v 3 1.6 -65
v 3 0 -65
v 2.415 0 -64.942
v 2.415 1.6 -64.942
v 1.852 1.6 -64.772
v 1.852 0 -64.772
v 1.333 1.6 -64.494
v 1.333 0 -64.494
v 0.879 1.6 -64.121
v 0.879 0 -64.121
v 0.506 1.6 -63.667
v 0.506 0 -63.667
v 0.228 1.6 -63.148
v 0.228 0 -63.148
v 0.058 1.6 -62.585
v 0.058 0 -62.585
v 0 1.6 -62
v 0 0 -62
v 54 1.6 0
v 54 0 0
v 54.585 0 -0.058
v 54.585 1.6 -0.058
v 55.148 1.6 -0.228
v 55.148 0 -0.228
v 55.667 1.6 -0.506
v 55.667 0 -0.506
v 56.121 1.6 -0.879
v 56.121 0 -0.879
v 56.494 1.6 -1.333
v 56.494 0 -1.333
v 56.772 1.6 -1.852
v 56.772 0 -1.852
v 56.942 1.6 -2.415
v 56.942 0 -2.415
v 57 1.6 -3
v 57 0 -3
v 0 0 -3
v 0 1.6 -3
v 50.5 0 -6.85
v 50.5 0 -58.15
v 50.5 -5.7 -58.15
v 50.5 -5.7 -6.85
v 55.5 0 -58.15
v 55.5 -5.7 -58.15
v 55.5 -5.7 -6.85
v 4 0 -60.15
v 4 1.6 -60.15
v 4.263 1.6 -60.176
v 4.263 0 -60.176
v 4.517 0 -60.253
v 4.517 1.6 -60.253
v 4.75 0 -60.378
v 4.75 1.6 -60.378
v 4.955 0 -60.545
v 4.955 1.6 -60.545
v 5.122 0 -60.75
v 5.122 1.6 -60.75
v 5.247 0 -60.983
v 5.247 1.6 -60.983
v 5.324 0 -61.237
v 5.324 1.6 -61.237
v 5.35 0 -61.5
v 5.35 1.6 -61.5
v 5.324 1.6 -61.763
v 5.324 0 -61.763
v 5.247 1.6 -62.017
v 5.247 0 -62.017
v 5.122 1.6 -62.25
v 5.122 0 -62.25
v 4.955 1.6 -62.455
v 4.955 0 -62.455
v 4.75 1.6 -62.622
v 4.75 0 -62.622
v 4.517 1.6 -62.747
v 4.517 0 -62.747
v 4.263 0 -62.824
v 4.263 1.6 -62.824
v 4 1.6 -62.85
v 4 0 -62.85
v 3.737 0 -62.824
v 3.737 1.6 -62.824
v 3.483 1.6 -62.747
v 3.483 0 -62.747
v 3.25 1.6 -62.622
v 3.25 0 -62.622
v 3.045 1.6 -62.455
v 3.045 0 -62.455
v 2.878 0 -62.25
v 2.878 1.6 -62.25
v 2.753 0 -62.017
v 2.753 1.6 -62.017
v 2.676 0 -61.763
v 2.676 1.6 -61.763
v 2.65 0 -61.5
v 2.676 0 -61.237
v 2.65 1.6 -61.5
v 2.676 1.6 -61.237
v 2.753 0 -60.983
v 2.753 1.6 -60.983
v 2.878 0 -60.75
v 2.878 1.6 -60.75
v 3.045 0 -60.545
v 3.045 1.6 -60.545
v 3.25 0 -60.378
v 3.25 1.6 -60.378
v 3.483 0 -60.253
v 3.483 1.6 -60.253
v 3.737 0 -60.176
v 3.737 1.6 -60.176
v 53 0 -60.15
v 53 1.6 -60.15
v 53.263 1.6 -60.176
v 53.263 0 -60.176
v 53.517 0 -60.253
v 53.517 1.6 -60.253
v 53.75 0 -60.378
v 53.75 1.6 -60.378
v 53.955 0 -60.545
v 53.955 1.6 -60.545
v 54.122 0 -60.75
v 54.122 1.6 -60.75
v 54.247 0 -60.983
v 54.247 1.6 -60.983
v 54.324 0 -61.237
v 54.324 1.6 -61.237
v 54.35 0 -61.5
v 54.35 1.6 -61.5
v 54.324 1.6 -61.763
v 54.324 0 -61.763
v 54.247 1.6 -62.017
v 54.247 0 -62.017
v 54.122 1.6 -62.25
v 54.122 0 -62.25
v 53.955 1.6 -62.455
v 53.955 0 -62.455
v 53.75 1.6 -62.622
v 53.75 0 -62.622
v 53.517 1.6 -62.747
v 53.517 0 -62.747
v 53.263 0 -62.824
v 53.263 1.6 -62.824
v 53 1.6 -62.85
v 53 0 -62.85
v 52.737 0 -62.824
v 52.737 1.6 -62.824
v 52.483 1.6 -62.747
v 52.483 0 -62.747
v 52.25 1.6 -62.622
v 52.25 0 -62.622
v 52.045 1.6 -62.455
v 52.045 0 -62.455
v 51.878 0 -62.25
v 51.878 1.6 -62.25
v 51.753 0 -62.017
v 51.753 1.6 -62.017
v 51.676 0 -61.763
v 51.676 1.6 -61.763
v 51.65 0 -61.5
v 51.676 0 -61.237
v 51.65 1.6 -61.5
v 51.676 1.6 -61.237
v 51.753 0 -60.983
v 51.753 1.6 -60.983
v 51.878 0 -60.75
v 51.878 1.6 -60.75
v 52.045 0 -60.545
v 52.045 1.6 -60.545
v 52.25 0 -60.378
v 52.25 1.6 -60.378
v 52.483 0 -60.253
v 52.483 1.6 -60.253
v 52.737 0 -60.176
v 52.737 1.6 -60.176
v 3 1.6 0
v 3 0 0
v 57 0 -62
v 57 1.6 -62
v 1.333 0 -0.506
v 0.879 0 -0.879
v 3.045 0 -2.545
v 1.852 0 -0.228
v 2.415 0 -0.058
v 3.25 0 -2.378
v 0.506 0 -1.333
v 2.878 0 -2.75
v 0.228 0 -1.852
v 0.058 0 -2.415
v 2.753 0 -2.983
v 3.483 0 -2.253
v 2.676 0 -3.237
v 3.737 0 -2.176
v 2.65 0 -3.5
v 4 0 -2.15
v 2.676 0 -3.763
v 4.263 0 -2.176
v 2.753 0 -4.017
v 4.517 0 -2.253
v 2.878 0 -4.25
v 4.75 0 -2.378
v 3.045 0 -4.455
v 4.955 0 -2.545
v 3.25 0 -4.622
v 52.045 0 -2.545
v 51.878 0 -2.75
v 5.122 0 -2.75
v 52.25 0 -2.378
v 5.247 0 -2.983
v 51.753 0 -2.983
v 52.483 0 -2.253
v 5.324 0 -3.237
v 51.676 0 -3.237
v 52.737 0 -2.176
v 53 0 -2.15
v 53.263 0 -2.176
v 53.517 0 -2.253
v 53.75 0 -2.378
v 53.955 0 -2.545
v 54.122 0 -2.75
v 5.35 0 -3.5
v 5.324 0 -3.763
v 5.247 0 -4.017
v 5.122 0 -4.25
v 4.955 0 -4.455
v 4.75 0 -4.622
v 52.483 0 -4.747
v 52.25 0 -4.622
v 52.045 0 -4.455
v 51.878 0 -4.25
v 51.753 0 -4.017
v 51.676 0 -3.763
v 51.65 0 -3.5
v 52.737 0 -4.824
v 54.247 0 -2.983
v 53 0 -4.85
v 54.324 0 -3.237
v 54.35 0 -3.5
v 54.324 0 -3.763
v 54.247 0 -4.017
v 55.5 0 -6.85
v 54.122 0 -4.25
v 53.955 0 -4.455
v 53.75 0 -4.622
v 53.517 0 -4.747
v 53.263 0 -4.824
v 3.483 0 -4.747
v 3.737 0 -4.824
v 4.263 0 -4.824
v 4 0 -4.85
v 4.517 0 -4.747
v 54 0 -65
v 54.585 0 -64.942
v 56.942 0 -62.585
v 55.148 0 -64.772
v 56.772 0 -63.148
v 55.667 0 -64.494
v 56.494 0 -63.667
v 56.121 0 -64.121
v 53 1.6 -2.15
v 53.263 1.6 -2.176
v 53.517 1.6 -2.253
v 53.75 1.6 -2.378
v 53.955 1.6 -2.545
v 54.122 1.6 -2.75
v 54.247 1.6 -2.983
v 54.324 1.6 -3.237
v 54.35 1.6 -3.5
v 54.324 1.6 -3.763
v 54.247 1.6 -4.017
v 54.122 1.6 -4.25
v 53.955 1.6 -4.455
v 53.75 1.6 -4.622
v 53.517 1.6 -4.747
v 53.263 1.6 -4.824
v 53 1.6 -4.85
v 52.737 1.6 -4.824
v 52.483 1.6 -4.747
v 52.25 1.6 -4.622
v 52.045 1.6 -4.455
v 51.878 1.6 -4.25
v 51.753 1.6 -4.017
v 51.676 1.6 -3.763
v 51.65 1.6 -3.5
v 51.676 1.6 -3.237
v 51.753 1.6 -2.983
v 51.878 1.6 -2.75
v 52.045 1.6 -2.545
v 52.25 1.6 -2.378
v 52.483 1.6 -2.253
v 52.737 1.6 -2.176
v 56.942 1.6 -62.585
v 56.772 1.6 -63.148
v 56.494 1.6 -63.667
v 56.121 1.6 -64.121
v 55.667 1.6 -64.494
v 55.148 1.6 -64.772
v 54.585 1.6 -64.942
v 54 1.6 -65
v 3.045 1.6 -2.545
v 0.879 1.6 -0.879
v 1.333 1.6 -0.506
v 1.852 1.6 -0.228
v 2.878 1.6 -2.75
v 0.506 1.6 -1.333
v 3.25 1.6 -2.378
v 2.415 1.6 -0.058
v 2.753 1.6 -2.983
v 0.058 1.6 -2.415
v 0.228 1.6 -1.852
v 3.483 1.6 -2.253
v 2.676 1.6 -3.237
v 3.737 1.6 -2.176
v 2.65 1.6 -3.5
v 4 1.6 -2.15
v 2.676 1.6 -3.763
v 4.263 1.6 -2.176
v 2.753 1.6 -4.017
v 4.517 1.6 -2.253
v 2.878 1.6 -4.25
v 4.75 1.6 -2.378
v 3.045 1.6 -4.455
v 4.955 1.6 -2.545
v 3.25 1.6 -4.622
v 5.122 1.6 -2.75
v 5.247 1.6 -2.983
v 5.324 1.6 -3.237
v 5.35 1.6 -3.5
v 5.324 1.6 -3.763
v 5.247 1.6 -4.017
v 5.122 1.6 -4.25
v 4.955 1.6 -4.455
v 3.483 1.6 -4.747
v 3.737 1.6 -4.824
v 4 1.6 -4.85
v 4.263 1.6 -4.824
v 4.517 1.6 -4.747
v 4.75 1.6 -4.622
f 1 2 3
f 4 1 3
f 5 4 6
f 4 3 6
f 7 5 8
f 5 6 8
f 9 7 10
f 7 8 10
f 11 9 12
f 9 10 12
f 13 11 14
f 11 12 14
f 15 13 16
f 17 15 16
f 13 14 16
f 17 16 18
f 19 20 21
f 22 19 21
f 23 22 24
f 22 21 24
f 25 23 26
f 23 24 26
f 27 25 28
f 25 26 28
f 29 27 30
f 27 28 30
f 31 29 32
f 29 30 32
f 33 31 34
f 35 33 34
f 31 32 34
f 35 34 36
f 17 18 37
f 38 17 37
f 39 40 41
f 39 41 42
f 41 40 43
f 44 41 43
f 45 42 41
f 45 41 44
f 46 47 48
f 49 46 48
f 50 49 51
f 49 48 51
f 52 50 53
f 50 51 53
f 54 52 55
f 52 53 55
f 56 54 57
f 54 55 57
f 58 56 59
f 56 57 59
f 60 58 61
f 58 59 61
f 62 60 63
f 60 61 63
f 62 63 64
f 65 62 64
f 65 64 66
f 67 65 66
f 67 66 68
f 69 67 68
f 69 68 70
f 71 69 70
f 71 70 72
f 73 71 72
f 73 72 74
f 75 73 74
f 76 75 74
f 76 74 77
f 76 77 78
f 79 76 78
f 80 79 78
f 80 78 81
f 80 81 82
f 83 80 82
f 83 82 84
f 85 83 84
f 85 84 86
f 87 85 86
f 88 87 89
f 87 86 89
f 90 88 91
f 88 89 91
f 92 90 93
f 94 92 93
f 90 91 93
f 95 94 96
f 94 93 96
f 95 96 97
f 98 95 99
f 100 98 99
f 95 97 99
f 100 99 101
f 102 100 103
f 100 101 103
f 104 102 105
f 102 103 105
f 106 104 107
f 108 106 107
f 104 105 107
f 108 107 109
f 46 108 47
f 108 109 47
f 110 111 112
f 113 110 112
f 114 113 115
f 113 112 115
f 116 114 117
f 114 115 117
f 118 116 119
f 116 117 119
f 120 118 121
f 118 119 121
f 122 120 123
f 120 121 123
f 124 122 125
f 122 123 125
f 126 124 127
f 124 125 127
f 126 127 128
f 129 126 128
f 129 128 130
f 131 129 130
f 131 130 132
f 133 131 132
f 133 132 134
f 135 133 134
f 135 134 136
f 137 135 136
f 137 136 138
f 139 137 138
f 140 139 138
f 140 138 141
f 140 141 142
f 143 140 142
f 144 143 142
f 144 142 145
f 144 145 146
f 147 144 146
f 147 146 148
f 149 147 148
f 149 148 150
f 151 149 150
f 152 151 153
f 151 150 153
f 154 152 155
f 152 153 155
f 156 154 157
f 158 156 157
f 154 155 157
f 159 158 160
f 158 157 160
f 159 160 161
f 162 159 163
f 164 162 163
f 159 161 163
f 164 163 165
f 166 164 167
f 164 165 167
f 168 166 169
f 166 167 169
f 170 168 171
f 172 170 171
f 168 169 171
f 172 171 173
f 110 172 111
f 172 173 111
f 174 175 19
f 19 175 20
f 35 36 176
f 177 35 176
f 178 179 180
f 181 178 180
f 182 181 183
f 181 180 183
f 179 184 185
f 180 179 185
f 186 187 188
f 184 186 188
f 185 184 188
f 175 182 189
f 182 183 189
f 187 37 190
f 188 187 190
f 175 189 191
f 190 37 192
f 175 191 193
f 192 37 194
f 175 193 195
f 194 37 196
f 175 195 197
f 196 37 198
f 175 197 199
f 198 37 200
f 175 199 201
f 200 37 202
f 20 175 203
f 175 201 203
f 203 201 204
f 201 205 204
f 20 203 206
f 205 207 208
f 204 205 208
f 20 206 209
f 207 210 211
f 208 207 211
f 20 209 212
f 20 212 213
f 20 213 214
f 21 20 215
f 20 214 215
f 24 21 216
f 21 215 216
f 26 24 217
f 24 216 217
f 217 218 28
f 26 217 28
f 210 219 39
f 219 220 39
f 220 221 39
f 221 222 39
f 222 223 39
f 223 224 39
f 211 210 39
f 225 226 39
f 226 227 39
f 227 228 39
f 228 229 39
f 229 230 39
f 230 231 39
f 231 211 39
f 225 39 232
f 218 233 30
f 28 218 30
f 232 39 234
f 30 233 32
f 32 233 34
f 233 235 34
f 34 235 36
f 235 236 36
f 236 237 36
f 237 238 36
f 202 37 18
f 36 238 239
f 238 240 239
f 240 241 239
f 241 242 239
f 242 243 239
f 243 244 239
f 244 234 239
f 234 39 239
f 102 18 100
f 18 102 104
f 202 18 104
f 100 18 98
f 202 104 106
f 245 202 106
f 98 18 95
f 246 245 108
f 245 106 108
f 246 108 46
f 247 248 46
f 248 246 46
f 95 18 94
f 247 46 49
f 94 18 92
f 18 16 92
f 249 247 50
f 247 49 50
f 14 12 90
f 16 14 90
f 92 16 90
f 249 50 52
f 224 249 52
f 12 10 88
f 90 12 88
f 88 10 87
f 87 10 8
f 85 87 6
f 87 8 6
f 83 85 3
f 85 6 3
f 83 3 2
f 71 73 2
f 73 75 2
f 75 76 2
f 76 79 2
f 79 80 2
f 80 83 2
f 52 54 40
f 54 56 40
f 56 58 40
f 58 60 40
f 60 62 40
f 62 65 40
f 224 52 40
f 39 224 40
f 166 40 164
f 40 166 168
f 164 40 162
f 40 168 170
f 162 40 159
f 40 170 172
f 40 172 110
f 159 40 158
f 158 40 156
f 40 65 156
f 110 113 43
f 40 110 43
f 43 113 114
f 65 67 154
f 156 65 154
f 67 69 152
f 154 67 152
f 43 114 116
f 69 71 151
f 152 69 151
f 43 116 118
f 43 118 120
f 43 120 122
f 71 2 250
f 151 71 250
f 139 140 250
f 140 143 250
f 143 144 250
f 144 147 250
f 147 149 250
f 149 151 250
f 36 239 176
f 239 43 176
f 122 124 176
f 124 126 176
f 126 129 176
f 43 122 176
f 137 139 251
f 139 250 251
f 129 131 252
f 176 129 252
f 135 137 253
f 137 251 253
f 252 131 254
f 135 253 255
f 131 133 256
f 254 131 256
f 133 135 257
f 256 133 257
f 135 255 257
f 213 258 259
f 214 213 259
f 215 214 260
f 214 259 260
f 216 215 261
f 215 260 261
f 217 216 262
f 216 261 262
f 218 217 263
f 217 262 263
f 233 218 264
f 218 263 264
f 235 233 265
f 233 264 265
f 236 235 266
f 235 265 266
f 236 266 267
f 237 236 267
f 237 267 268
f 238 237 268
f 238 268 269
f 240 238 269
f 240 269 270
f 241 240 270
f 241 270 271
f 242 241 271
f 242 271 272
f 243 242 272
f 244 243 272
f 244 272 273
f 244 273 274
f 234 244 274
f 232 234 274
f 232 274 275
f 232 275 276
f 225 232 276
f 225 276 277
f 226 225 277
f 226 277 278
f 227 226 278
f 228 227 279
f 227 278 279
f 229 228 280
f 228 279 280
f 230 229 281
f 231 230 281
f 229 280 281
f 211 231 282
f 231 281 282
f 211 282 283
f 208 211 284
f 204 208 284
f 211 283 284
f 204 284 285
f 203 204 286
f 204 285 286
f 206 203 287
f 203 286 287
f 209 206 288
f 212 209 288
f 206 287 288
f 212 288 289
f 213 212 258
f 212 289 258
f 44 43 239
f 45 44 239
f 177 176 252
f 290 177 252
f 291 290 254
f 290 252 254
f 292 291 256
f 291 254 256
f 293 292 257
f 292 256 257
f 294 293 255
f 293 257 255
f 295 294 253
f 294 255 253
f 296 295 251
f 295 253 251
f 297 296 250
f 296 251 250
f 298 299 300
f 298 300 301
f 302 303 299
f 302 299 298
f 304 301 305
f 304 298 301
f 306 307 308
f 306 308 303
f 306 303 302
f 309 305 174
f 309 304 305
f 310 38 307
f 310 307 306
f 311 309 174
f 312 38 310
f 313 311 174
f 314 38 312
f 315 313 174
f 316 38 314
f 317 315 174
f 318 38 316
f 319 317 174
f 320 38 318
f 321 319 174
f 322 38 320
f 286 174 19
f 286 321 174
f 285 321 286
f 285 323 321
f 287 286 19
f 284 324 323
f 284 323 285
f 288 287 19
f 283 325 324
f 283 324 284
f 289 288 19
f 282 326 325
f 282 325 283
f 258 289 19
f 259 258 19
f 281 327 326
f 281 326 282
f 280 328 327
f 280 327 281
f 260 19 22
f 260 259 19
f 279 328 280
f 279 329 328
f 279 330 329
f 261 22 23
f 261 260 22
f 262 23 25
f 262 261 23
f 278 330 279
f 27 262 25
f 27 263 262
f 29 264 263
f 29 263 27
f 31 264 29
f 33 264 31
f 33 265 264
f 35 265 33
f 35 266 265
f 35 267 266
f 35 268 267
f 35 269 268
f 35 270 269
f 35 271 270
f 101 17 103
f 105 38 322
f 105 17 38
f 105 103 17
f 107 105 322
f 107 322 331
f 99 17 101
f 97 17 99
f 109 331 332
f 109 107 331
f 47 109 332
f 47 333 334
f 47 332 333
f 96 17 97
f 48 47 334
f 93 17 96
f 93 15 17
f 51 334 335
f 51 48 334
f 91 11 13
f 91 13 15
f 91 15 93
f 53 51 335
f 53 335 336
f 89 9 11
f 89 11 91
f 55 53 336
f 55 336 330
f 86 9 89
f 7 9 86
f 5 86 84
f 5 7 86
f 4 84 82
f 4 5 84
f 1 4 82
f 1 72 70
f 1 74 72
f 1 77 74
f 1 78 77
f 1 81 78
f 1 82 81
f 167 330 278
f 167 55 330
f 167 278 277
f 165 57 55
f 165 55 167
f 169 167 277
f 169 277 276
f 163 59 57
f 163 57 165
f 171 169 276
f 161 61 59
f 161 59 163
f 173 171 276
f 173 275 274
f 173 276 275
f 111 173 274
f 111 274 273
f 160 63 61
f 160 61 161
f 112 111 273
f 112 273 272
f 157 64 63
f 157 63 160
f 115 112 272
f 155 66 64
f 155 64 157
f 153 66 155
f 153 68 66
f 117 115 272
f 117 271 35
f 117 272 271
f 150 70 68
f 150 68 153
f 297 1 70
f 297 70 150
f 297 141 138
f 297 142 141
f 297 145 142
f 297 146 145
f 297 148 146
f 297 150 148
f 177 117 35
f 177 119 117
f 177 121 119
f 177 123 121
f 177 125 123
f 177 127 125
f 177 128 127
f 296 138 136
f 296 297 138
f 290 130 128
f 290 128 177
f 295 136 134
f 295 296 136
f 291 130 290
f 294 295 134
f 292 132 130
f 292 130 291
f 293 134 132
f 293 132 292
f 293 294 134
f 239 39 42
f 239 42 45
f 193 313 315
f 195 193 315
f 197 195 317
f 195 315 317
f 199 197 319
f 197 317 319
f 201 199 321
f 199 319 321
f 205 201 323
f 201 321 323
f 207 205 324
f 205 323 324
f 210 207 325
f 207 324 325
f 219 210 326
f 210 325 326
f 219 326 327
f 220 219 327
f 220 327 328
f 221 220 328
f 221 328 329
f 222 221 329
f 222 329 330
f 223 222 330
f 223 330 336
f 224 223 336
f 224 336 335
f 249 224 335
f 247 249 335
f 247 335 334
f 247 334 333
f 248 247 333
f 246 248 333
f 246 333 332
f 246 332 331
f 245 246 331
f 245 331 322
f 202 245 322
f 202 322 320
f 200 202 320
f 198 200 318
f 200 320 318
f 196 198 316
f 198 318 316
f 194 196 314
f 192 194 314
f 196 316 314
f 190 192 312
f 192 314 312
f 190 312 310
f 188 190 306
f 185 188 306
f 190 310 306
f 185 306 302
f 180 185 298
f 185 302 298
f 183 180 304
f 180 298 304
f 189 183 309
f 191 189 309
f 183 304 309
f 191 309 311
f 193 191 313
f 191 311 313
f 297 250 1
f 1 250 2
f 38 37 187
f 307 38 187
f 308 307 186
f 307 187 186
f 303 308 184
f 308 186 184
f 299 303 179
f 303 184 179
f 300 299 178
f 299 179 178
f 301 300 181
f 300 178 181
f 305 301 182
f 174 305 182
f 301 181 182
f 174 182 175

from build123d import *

# Parameters (mm, degrees)
BOSS_EXTRUDE1_DEPTH = 1.6
SKETCH2_R           = 1.35
CUT_EXTRUDE1_DEPTH  = 87.467103571
SKETCH3_W           = 5
SKETCH3_H           = 51.3
BOSS_EXTRUDE2_DEPTH = 5.7


with BuildPart() as part:
    # Sketch1 → Boss-Extrude1 (new body)
    with BuildSketch(Plane(origin=(0, 0, 0), x_dir=(1, 0, 0), z_dir=(0, 1, 0))):
        with BuildLine():
            Line((3, 0), (54, 0))
            ThreePointArc((54, 0), (56.121320344, 0.878679656), (57, 3))
            Line((57, 3), (57, 62))
            ThreePointArc((57, 62), (56.121320344, 64.121320344), (54, 65))
            Line((54, 65), (3, 65))
            ThreePointArc((3, 65), (0.878679656, 64.121320344), (0, 62))
            Line((0, 62), (0, 3))
            ThreePointArc((0, 3), (0.878679656, 0.878679656), (3, 0))
        make_face()
    extrude(amount=BOSS_EXTRUDE1_DEPTH)

    # Sketch2 → Cut-Extrude1 (cut, through all)
    with BuildSketch(Plane(origin=(0, 1.6, 0), x_dir=(1, 0, 0), z_dir=(0, 1, 0))):
        with Locations(Location((4, 61.5, 0), (0, 0, 270))):
            Circle(SKETCH2_R)
        with Locations(Location((53, 61.5, 0), (0, 0, 270))):
            Circle(SKETCH2_R)
        with Locations(Location((53, 3.5, 0), (0, 0, 270))):
            Circle(SKETCH2_R)
        with Locations(Location((4, 3.5, 0), (0, 0, 270))):
            Circle(SKETCH2_R)
    extrude(amount=-CUT_EXTRUDE1_DEPTH, mode=Mode.SUBTRACT)

    # Sketch3 → Boss-Extrude2 (add)
    with BuildSketch(Plane.XZ):
        with Locations((53, -32.5)):
            Rectangle(SKETCH3_W, SKETCH3_H)
    extrude(amount=BOSS_EXTRUDE2_DEPTH)


solid = part.part
